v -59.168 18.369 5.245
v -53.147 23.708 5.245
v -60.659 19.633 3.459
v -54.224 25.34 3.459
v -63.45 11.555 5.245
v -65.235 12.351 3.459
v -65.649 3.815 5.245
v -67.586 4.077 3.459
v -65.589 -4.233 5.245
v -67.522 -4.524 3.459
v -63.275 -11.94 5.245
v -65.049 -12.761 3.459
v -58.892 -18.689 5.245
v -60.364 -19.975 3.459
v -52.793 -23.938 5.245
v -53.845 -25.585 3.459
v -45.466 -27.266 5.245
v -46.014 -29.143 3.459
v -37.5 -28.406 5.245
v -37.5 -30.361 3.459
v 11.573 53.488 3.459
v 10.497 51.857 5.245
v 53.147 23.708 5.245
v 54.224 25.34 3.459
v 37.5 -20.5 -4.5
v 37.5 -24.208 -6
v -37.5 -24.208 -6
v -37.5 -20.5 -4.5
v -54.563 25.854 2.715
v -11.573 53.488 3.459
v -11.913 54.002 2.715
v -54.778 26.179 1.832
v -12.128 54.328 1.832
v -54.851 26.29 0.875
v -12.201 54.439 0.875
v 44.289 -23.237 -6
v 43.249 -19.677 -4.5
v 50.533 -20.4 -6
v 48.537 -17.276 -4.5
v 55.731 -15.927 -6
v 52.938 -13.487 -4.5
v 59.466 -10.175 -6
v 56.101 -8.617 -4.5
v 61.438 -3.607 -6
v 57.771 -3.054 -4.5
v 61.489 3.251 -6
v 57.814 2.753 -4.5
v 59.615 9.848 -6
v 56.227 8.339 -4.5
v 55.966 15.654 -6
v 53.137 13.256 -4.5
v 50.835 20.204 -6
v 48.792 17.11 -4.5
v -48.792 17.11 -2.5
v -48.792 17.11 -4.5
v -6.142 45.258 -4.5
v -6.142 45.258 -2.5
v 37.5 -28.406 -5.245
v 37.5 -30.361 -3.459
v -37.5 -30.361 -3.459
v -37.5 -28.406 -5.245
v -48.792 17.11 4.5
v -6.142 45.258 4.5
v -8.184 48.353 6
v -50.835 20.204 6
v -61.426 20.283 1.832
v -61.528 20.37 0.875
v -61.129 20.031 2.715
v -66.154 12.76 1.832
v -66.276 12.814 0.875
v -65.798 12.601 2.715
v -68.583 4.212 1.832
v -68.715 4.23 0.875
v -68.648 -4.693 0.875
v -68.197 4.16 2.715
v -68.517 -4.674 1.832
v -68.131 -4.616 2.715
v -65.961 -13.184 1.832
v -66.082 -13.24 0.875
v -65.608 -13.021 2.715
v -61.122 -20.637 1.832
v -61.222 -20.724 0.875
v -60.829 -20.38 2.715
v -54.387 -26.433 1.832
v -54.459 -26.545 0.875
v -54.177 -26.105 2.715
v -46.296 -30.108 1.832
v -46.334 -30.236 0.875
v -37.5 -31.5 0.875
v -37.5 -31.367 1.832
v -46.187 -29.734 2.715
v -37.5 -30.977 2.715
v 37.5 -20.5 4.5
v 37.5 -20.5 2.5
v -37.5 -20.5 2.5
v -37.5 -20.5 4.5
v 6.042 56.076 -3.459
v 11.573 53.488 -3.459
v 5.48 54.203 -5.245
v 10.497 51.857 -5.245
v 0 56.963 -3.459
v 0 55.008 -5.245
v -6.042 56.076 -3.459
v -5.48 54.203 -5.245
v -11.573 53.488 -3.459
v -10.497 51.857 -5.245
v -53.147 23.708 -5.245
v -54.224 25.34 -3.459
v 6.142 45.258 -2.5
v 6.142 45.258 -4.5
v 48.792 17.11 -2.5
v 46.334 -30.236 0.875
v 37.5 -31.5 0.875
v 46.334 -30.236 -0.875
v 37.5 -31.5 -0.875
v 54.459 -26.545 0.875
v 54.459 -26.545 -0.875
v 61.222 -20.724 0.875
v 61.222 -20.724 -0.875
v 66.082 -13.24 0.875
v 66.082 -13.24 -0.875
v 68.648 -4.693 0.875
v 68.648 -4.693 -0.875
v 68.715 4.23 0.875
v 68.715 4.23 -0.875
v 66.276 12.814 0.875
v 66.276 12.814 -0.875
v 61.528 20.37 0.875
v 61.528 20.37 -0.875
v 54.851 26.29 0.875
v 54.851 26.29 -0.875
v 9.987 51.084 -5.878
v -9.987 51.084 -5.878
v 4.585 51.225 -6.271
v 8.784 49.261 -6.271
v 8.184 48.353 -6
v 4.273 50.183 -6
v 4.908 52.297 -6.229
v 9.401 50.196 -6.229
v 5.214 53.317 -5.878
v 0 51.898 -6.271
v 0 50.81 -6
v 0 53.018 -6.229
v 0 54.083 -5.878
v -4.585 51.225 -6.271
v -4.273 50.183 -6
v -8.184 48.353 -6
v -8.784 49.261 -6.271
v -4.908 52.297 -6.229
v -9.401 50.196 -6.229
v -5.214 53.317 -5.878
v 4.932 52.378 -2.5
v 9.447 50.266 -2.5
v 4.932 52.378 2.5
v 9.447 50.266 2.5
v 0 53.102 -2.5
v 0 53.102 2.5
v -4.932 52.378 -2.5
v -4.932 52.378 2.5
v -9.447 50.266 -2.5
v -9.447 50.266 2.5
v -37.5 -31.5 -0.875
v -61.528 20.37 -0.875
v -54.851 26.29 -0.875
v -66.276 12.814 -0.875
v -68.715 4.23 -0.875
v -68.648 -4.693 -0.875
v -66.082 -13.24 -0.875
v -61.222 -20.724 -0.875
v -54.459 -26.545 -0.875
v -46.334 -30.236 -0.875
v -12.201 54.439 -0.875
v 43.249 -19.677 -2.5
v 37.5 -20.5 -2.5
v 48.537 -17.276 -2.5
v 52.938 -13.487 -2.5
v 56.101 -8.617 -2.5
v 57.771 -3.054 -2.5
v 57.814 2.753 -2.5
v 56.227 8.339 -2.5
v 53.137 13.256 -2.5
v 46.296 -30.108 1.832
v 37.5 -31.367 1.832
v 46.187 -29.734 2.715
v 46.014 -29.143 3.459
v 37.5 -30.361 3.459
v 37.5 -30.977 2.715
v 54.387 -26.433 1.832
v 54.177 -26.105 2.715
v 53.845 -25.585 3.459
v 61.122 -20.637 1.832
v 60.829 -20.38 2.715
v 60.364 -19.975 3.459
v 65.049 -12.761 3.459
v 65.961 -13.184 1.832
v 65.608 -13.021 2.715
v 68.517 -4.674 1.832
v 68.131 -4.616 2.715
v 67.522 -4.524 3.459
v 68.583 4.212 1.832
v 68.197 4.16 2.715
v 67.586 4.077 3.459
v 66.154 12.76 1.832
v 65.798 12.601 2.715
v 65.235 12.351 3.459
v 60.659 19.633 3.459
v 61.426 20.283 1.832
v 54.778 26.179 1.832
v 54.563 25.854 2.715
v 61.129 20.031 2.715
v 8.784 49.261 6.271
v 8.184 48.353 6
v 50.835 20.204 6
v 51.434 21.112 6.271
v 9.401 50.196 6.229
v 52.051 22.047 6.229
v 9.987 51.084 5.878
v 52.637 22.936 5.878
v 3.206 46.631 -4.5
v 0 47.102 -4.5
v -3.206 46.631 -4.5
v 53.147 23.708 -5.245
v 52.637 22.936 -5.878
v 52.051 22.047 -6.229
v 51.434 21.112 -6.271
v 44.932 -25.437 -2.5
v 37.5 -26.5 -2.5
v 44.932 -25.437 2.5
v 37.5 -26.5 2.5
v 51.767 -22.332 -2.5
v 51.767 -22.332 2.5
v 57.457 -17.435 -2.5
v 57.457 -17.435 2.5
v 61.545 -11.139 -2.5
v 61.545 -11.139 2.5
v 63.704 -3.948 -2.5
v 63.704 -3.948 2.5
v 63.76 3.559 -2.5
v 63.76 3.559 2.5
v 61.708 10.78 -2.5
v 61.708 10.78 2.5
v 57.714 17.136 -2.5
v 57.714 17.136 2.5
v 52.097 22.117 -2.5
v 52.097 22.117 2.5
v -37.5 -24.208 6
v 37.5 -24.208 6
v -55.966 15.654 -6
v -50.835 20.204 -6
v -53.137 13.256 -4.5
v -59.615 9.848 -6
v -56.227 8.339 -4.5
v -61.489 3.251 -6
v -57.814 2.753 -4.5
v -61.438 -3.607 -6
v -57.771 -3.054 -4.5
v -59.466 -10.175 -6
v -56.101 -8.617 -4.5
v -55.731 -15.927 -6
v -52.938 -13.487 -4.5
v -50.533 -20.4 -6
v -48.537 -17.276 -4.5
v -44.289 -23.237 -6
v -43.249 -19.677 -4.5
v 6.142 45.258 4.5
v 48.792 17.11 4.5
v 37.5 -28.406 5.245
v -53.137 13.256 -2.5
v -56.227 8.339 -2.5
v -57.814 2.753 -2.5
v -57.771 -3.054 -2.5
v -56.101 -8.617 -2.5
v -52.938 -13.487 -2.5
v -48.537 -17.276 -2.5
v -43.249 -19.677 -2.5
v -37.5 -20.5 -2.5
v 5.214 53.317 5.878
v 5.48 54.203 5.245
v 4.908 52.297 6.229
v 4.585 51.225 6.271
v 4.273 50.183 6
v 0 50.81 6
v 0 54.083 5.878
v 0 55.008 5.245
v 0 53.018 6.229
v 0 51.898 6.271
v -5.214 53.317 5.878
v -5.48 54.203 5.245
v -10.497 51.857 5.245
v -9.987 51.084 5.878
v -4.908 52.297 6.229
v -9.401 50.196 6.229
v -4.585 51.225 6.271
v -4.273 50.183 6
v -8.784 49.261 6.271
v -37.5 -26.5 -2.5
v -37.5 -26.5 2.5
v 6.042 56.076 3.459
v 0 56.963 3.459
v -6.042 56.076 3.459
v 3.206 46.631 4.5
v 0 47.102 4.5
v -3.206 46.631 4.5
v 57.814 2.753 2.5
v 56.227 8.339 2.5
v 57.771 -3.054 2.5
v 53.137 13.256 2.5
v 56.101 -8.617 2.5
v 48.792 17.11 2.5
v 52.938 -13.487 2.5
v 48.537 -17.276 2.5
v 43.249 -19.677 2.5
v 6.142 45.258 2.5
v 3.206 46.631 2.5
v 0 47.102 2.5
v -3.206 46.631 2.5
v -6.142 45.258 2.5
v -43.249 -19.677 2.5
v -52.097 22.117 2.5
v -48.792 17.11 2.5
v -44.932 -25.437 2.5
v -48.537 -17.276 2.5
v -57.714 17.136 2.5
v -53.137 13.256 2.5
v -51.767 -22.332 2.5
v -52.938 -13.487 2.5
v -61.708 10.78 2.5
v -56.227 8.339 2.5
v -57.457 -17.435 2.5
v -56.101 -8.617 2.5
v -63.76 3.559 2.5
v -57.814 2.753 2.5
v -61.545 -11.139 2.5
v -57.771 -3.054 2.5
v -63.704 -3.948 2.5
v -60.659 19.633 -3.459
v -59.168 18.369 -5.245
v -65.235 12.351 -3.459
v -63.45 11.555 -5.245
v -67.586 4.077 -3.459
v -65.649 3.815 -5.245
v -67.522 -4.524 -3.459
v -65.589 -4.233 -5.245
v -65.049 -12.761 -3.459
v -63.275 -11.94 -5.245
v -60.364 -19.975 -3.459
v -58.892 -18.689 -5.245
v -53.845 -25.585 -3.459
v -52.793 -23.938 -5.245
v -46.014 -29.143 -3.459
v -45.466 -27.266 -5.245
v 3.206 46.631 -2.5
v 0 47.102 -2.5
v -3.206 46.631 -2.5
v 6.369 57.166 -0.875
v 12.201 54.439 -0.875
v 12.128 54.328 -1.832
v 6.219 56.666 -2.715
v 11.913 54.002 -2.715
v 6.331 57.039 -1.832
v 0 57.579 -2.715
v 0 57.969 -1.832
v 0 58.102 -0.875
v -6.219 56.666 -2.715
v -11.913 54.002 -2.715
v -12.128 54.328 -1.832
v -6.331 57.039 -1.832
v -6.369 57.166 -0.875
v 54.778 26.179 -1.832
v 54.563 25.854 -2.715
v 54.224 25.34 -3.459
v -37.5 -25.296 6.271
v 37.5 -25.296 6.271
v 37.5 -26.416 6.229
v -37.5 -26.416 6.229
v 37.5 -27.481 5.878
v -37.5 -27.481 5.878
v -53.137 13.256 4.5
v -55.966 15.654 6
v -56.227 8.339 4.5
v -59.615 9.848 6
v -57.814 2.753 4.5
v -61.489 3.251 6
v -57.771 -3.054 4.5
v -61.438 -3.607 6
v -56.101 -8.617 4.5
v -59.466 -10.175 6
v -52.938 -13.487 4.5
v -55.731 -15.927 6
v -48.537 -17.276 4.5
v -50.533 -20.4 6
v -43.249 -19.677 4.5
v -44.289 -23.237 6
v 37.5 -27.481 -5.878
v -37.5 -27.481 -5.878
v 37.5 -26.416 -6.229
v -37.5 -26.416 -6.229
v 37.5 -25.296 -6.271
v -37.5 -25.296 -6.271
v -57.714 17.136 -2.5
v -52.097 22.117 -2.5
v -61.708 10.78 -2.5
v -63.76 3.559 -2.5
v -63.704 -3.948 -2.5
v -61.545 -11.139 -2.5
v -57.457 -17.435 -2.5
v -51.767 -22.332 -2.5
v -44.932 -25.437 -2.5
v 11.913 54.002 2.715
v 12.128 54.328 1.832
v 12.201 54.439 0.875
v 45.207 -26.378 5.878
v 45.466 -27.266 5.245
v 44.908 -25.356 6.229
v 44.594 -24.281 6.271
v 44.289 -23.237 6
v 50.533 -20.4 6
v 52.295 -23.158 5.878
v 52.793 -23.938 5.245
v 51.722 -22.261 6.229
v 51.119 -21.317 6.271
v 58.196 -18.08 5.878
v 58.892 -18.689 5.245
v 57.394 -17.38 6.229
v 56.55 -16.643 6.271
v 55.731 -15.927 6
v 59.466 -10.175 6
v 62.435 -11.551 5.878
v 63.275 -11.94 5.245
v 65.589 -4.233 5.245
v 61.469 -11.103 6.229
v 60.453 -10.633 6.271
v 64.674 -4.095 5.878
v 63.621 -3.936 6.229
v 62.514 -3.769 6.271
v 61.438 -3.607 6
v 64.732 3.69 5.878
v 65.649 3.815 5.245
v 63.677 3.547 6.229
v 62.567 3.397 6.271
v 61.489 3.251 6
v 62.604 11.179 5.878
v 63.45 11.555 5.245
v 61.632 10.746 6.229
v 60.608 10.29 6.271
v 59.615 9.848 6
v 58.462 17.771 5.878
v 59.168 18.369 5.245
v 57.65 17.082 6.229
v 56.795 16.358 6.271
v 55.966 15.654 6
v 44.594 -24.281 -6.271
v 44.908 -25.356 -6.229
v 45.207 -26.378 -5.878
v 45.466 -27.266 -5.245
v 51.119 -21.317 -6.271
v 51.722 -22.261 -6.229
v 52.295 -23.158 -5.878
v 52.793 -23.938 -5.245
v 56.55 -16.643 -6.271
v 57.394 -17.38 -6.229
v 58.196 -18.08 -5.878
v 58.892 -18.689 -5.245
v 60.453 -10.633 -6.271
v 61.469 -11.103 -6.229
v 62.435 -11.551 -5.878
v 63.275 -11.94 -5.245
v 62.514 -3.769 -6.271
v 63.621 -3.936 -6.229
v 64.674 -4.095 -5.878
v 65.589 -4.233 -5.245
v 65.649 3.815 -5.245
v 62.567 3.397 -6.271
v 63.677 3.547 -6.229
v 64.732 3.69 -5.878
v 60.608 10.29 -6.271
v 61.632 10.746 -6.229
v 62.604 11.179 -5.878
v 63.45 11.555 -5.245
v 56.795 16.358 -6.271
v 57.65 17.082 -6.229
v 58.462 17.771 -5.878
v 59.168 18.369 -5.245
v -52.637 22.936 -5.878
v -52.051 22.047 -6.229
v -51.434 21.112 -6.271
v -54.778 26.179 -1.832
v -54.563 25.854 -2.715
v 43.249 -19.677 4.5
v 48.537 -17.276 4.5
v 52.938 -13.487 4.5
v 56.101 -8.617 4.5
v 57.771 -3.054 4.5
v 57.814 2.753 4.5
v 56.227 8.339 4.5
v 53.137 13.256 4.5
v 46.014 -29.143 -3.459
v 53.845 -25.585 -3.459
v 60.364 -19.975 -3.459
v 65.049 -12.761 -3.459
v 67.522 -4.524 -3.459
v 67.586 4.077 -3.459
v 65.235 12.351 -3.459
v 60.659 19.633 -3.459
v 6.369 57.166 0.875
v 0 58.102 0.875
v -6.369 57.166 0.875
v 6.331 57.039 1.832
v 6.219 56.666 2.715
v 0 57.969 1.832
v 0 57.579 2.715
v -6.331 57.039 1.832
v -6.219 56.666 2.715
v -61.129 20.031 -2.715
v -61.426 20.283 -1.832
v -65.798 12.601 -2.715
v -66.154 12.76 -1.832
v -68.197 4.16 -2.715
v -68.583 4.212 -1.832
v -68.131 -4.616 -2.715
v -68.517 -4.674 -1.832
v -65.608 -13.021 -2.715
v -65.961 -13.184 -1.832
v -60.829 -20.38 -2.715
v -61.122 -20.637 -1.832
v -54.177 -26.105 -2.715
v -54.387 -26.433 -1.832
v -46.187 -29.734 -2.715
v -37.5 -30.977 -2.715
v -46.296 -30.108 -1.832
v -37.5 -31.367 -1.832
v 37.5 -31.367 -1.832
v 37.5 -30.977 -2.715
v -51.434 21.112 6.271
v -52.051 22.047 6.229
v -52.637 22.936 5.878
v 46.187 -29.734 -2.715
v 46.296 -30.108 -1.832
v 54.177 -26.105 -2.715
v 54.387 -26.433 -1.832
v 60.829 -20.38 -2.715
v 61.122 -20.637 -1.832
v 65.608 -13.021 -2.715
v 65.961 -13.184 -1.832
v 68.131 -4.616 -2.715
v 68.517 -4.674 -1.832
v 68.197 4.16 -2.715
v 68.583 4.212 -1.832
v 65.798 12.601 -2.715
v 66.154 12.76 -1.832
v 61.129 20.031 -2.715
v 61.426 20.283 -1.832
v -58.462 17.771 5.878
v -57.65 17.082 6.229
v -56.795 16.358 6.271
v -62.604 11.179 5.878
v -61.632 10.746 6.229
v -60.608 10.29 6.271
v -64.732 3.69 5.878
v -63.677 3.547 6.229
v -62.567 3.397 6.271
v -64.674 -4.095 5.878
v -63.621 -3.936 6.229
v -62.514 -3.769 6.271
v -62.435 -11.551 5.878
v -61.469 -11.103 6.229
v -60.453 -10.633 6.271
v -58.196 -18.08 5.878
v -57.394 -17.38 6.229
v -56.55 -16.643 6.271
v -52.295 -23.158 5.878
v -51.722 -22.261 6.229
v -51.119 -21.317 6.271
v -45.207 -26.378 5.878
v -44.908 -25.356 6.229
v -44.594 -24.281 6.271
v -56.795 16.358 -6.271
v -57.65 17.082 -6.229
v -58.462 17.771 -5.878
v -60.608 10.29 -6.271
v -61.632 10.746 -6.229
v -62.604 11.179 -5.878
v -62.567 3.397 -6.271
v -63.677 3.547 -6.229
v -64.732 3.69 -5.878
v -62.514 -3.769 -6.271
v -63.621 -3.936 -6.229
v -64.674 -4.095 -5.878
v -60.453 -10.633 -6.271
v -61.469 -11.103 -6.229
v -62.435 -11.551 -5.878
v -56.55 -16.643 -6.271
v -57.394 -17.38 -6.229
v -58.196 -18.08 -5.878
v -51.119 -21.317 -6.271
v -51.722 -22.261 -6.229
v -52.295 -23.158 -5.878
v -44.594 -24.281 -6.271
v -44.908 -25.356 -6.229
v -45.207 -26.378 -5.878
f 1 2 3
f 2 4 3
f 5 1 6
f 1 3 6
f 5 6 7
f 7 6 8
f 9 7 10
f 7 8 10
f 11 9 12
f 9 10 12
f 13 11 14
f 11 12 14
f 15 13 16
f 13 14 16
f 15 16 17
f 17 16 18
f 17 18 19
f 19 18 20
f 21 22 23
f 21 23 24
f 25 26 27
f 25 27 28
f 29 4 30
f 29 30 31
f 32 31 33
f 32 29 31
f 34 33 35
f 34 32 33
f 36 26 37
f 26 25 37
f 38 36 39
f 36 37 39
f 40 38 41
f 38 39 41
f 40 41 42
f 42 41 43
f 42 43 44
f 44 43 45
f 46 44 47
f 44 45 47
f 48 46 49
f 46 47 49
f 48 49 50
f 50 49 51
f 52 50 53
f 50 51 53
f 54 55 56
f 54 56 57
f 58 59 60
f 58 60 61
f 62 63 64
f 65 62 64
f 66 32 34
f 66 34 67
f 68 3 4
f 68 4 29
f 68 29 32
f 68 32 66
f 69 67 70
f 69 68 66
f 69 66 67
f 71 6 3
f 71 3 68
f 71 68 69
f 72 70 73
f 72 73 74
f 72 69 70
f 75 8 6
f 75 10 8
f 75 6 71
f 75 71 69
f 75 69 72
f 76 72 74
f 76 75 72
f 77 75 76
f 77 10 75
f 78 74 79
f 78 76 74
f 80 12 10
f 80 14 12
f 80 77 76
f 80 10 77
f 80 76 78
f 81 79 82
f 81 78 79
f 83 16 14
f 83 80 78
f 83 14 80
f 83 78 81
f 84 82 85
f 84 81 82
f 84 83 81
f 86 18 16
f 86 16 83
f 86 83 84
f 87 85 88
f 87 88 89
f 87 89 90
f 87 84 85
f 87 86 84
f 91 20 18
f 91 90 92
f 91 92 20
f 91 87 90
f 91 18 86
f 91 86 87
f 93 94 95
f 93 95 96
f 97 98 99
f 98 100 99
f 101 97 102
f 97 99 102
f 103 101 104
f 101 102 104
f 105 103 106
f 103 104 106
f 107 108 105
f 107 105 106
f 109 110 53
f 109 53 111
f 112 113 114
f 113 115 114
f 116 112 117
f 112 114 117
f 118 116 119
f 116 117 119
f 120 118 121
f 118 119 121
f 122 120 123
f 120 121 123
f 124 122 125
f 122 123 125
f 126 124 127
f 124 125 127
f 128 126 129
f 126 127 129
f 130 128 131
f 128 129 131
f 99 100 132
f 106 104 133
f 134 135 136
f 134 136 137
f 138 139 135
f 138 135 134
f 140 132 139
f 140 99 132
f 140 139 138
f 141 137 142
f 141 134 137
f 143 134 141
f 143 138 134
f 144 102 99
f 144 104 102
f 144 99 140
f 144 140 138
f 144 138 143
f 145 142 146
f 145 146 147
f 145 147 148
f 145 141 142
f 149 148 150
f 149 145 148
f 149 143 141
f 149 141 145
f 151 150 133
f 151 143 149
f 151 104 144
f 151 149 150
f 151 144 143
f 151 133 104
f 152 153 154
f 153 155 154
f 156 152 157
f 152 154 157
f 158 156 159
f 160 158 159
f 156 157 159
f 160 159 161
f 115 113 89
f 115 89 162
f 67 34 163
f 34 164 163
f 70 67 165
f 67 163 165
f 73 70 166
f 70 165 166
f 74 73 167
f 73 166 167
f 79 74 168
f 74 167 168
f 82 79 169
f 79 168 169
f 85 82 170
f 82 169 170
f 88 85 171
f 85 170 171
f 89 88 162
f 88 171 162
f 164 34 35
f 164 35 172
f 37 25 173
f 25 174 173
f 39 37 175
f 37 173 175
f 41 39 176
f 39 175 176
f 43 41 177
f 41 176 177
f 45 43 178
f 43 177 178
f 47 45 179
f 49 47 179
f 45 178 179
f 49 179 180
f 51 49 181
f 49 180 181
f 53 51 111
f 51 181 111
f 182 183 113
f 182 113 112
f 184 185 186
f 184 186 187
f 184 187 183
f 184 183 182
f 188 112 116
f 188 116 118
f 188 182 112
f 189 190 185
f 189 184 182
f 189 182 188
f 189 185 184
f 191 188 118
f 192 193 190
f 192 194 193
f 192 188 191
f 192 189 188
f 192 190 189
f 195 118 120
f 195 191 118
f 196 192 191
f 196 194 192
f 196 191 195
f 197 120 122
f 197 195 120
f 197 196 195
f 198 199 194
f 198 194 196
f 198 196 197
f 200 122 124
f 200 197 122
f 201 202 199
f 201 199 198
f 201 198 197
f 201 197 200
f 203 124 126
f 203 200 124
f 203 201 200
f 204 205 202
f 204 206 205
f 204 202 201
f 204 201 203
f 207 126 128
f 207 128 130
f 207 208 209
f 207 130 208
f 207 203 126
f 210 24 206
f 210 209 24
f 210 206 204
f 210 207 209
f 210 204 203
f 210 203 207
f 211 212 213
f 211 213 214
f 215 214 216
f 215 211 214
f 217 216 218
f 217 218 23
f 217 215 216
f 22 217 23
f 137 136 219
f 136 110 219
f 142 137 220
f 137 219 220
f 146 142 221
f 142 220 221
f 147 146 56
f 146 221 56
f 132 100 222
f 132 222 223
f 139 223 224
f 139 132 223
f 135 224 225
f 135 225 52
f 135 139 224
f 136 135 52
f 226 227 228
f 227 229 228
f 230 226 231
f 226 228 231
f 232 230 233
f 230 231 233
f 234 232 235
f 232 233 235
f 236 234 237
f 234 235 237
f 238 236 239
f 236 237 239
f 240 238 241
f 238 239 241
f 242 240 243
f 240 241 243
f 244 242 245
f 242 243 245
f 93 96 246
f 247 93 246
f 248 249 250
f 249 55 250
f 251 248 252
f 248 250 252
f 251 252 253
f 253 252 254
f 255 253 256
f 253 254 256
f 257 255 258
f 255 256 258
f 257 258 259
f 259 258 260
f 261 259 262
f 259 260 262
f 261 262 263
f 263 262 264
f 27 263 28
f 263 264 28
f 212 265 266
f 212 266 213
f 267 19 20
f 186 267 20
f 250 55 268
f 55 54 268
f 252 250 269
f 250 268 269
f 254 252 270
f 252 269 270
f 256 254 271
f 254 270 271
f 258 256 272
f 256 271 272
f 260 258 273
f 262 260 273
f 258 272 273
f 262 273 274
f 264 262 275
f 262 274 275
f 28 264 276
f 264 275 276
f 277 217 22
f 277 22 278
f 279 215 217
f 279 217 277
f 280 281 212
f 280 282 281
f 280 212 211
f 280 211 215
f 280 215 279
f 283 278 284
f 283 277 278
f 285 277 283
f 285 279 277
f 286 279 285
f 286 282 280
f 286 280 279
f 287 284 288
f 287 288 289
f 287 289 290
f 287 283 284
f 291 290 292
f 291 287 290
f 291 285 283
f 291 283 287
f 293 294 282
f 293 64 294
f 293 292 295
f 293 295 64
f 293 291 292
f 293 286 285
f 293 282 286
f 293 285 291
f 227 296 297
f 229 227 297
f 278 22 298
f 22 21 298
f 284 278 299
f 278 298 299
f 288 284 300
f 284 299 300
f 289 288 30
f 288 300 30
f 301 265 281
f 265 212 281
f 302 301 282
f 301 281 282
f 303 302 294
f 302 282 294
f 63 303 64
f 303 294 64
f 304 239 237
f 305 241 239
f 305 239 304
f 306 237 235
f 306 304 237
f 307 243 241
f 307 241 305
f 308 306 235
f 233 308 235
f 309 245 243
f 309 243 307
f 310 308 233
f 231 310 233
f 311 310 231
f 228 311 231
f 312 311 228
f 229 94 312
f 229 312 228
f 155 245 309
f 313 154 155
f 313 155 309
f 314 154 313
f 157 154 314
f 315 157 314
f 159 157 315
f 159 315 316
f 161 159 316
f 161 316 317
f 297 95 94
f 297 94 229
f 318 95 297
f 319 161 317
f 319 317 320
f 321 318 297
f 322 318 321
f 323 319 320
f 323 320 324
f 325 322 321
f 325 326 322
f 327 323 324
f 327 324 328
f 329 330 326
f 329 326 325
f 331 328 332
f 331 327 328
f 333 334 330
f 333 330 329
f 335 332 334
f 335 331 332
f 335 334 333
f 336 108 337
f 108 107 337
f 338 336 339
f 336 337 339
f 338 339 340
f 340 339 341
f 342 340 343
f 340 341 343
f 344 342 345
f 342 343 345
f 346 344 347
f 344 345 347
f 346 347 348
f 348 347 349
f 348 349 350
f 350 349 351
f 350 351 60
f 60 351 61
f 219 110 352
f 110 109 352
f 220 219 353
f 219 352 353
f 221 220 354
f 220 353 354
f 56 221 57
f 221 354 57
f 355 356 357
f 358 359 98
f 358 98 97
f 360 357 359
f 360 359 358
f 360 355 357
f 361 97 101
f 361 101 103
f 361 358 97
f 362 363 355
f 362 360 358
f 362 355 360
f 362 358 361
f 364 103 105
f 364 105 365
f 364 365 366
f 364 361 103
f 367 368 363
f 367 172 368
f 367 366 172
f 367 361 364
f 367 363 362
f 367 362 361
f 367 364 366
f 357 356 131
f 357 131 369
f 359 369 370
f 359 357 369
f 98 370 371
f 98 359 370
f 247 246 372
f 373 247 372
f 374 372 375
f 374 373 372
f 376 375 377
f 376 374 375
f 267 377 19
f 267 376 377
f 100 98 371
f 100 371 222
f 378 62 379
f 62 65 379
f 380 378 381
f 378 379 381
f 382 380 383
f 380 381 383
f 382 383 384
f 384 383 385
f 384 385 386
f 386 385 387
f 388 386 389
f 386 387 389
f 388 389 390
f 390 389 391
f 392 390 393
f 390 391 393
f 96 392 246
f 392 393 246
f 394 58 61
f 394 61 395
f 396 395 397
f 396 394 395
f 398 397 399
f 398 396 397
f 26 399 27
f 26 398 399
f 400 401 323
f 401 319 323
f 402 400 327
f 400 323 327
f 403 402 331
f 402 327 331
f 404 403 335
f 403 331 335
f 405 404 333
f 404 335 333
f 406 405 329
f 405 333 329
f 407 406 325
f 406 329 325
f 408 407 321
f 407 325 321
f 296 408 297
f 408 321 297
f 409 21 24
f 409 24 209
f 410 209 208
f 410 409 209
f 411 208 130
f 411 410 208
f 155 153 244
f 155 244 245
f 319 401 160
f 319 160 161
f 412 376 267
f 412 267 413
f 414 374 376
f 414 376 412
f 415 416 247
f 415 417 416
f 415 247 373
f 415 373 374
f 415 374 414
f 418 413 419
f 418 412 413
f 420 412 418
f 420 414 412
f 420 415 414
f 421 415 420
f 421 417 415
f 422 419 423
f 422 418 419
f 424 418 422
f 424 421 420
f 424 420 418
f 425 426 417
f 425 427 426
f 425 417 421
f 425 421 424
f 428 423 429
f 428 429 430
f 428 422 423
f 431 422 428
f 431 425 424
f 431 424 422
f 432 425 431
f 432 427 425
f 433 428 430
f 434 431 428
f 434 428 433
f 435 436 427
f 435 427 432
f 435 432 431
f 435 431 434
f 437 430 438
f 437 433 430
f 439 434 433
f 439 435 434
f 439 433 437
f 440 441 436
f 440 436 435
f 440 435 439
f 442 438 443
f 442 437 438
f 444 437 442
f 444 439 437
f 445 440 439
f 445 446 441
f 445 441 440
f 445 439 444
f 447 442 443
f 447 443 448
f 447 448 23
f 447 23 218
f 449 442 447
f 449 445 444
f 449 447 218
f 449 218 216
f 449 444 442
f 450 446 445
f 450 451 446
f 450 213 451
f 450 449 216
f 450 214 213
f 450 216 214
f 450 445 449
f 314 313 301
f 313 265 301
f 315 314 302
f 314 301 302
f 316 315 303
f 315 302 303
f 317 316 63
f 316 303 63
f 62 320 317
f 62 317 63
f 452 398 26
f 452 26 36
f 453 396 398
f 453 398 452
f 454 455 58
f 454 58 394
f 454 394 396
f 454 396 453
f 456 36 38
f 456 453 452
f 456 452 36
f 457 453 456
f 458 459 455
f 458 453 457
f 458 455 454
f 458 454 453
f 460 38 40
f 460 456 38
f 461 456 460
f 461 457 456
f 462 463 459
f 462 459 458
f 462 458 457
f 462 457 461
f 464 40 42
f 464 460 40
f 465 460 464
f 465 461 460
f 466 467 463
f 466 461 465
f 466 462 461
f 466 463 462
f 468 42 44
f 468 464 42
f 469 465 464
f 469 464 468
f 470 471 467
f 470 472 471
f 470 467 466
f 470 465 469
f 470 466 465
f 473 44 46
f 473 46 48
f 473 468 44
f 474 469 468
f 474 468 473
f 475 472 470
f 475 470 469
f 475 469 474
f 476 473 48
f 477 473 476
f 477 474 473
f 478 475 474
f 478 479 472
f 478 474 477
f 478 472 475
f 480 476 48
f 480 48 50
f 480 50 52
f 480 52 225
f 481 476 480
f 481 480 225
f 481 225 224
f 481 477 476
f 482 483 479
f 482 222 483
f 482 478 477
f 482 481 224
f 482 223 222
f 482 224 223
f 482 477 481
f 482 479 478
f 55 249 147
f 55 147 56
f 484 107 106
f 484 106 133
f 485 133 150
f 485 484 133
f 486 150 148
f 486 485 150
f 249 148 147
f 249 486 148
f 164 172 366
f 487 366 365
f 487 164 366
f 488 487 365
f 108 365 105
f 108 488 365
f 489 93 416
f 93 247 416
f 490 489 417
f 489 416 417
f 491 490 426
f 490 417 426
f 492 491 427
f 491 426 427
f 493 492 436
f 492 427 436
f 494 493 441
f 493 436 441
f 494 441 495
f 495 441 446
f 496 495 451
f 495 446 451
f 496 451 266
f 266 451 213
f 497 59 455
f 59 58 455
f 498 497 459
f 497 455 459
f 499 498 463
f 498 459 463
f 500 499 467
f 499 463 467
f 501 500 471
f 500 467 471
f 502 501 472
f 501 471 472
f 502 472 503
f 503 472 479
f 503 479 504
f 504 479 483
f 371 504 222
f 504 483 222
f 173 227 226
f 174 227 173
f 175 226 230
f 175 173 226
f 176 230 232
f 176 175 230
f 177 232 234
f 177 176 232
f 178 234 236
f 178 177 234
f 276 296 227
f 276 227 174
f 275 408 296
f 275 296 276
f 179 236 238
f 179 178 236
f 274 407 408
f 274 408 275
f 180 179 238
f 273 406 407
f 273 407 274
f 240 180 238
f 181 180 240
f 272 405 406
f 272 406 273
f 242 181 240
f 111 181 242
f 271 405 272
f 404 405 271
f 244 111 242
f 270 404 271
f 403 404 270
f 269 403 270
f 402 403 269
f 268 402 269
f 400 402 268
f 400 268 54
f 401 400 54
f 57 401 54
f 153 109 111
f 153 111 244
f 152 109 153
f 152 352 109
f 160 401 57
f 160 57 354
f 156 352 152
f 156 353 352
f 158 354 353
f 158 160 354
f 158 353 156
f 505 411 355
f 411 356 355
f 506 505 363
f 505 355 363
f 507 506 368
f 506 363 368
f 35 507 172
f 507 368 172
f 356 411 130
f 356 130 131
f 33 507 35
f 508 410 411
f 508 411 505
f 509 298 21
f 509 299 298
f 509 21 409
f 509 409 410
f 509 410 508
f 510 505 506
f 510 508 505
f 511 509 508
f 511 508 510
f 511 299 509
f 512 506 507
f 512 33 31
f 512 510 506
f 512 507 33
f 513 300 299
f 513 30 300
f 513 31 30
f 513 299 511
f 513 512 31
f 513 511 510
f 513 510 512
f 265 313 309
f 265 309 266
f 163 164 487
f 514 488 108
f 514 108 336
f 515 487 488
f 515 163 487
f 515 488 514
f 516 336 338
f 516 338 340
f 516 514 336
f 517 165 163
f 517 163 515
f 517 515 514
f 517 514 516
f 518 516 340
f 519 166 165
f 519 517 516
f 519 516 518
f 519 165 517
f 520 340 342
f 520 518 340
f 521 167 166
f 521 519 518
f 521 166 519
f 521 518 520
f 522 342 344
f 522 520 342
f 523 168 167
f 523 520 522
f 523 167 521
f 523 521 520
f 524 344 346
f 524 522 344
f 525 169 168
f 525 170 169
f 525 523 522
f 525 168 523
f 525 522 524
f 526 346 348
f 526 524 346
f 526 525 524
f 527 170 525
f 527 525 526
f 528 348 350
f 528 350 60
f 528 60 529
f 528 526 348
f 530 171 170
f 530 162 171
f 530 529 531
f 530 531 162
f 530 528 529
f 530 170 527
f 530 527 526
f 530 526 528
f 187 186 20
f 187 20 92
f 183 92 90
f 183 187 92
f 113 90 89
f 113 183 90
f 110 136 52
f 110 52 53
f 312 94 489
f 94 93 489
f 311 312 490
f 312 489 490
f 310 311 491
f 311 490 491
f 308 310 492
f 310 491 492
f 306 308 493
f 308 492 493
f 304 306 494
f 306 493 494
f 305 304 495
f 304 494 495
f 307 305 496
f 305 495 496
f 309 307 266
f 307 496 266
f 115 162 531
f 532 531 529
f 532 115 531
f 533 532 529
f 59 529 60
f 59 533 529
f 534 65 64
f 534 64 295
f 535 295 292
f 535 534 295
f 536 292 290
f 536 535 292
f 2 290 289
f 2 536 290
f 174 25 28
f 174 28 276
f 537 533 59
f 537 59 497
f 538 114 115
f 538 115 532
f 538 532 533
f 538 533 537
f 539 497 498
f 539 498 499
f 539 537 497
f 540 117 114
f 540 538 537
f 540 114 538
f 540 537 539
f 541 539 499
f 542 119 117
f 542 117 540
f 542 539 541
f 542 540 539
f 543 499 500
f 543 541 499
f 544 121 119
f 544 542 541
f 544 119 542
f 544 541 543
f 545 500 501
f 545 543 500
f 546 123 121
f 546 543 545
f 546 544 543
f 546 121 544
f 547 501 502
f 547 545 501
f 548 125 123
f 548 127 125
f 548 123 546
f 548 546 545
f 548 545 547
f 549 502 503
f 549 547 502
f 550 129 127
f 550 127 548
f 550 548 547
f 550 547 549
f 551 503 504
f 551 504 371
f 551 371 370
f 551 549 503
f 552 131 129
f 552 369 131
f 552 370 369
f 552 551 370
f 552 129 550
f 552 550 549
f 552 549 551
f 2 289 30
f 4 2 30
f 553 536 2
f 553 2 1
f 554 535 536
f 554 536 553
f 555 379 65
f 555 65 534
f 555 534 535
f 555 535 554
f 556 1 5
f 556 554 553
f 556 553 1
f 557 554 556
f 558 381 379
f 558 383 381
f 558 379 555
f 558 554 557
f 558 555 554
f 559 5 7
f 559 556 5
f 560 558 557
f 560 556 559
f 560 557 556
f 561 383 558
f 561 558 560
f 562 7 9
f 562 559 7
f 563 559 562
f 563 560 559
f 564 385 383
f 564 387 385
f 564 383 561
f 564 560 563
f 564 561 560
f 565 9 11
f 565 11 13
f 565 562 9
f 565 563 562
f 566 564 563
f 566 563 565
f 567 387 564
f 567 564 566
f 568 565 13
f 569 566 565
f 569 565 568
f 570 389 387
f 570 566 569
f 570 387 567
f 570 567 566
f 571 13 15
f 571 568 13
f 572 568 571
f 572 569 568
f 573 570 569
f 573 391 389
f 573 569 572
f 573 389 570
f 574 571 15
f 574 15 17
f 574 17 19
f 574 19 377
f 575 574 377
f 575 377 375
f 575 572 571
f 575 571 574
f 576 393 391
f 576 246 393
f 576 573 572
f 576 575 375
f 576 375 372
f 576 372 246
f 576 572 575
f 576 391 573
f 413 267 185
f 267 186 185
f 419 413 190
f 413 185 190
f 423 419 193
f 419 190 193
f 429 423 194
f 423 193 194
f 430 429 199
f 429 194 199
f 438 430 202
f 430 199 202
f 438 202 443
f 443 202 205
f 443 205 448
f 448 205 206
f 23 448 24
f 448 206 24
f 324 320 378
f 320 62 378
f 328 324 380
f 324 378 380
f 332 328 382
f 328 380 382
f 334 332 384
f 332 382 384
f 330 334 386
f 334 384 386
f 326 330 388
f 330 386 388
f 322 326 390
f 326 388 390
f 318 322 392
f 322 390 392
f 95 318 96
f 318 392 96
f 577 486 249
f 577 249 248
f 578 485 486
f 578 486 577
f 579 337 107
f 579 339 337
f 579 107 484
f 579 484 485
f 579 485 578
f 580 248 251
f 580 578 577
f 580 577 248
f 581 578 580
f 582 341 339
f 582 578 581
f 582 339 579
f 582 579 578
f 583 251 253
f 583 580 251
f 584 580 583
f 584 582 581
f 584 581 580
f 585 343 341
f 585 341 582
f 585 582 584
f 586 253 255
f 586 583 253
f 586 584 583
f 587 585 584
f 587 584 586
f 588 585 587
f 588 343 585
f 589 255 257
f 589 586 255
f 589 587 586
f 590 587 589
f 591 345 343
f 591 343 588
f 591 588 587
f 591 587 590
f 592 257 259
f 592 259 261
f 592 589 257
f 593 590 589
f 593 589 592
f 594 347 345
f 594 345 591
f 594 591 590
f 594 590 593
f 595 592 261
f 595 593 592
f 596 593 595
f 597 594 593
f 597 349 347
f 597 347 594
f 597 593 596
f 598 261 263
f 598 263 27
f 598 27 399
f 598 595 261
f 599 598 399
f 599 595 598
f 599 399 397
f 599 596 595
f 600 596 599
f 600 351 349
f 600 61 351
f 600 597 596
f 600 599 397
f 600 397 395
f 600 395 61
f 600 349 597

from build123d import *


with BuildPart() as part:
    # Balayage1: sweep along a path in Esquisse1
    with BuildLine(Plane.XY) as balayage1_path:
        Line((48.792061638, 17.109637903), (6.141771071, 45.25804309))
        ThreePointArc((6.141771071, 45.25804309), (0, 47.102069304), (-6.141771071, 45.25804309))
        Line((-6.141771071, 45.25804309), (-48.792061638, 17.109637903))
        ThreePointArc((-48.792061638, 17.109637903), (-57.134139235, -5.895015818), (-37.50001617, -20.5))
        Line((-37.50001617, -20.5), (37.50001617, -20.5))
        ThreePointArc((37.50001617, -20.5), (57.134139235, -5.895015818), (48.792061638, 17.109637903))
    # Esquisse2 → Balayage1 (sweep)
    with BuildSketch(Plane(origin=(0, 0, 0), x_dir=(0, 0, -1), z_dir=(1, 0, 0))):
        with BuildLine():
            Line((-4.5, -20.5), (-2.5, -20.5))
            Line((-2.5, -20.5), (-2.5, -26.5))
            Line((-2.5, -26.5), (2.5, -26.5))
            Line((2.5, -26.5), (2.5, -20.5))
            Line((2.5, -20.5), (4.5, -20.5))
            Line((4.5, -20.5), (6, -24.208099244))
            ThreePointArc((6, -24.208099244), (6.228715258, -26.416259945), (5.244821685, -28.406294565))
            Line((5.244821685, -28.406294565), (3.458805812, -30.360920906))
            ThreePointArc((3.458805812, -30.360920906), (2.286874079, -31.202594508), (0.875, -31.5))
            Line((0.875, -31.5), (-0.875, -31.5))
            ThreePointArc((-0.875, -31.5), (-2.286874079, -31.202594508), (-3.458805812, -30.360920906))
            Line((-3.458805812, -30.360920906), (-5.244821685, -28.406294565))
            ThreePointArc((-5.244821685, -28.406294565), (-6.228715258, -26.416259945), (-6, -24.208099244))
            Line((-6, -24.208099244), (-4.5, -20.5))
        make_face()
    sweep(path=balayage1_path.line)


solid = part.part
